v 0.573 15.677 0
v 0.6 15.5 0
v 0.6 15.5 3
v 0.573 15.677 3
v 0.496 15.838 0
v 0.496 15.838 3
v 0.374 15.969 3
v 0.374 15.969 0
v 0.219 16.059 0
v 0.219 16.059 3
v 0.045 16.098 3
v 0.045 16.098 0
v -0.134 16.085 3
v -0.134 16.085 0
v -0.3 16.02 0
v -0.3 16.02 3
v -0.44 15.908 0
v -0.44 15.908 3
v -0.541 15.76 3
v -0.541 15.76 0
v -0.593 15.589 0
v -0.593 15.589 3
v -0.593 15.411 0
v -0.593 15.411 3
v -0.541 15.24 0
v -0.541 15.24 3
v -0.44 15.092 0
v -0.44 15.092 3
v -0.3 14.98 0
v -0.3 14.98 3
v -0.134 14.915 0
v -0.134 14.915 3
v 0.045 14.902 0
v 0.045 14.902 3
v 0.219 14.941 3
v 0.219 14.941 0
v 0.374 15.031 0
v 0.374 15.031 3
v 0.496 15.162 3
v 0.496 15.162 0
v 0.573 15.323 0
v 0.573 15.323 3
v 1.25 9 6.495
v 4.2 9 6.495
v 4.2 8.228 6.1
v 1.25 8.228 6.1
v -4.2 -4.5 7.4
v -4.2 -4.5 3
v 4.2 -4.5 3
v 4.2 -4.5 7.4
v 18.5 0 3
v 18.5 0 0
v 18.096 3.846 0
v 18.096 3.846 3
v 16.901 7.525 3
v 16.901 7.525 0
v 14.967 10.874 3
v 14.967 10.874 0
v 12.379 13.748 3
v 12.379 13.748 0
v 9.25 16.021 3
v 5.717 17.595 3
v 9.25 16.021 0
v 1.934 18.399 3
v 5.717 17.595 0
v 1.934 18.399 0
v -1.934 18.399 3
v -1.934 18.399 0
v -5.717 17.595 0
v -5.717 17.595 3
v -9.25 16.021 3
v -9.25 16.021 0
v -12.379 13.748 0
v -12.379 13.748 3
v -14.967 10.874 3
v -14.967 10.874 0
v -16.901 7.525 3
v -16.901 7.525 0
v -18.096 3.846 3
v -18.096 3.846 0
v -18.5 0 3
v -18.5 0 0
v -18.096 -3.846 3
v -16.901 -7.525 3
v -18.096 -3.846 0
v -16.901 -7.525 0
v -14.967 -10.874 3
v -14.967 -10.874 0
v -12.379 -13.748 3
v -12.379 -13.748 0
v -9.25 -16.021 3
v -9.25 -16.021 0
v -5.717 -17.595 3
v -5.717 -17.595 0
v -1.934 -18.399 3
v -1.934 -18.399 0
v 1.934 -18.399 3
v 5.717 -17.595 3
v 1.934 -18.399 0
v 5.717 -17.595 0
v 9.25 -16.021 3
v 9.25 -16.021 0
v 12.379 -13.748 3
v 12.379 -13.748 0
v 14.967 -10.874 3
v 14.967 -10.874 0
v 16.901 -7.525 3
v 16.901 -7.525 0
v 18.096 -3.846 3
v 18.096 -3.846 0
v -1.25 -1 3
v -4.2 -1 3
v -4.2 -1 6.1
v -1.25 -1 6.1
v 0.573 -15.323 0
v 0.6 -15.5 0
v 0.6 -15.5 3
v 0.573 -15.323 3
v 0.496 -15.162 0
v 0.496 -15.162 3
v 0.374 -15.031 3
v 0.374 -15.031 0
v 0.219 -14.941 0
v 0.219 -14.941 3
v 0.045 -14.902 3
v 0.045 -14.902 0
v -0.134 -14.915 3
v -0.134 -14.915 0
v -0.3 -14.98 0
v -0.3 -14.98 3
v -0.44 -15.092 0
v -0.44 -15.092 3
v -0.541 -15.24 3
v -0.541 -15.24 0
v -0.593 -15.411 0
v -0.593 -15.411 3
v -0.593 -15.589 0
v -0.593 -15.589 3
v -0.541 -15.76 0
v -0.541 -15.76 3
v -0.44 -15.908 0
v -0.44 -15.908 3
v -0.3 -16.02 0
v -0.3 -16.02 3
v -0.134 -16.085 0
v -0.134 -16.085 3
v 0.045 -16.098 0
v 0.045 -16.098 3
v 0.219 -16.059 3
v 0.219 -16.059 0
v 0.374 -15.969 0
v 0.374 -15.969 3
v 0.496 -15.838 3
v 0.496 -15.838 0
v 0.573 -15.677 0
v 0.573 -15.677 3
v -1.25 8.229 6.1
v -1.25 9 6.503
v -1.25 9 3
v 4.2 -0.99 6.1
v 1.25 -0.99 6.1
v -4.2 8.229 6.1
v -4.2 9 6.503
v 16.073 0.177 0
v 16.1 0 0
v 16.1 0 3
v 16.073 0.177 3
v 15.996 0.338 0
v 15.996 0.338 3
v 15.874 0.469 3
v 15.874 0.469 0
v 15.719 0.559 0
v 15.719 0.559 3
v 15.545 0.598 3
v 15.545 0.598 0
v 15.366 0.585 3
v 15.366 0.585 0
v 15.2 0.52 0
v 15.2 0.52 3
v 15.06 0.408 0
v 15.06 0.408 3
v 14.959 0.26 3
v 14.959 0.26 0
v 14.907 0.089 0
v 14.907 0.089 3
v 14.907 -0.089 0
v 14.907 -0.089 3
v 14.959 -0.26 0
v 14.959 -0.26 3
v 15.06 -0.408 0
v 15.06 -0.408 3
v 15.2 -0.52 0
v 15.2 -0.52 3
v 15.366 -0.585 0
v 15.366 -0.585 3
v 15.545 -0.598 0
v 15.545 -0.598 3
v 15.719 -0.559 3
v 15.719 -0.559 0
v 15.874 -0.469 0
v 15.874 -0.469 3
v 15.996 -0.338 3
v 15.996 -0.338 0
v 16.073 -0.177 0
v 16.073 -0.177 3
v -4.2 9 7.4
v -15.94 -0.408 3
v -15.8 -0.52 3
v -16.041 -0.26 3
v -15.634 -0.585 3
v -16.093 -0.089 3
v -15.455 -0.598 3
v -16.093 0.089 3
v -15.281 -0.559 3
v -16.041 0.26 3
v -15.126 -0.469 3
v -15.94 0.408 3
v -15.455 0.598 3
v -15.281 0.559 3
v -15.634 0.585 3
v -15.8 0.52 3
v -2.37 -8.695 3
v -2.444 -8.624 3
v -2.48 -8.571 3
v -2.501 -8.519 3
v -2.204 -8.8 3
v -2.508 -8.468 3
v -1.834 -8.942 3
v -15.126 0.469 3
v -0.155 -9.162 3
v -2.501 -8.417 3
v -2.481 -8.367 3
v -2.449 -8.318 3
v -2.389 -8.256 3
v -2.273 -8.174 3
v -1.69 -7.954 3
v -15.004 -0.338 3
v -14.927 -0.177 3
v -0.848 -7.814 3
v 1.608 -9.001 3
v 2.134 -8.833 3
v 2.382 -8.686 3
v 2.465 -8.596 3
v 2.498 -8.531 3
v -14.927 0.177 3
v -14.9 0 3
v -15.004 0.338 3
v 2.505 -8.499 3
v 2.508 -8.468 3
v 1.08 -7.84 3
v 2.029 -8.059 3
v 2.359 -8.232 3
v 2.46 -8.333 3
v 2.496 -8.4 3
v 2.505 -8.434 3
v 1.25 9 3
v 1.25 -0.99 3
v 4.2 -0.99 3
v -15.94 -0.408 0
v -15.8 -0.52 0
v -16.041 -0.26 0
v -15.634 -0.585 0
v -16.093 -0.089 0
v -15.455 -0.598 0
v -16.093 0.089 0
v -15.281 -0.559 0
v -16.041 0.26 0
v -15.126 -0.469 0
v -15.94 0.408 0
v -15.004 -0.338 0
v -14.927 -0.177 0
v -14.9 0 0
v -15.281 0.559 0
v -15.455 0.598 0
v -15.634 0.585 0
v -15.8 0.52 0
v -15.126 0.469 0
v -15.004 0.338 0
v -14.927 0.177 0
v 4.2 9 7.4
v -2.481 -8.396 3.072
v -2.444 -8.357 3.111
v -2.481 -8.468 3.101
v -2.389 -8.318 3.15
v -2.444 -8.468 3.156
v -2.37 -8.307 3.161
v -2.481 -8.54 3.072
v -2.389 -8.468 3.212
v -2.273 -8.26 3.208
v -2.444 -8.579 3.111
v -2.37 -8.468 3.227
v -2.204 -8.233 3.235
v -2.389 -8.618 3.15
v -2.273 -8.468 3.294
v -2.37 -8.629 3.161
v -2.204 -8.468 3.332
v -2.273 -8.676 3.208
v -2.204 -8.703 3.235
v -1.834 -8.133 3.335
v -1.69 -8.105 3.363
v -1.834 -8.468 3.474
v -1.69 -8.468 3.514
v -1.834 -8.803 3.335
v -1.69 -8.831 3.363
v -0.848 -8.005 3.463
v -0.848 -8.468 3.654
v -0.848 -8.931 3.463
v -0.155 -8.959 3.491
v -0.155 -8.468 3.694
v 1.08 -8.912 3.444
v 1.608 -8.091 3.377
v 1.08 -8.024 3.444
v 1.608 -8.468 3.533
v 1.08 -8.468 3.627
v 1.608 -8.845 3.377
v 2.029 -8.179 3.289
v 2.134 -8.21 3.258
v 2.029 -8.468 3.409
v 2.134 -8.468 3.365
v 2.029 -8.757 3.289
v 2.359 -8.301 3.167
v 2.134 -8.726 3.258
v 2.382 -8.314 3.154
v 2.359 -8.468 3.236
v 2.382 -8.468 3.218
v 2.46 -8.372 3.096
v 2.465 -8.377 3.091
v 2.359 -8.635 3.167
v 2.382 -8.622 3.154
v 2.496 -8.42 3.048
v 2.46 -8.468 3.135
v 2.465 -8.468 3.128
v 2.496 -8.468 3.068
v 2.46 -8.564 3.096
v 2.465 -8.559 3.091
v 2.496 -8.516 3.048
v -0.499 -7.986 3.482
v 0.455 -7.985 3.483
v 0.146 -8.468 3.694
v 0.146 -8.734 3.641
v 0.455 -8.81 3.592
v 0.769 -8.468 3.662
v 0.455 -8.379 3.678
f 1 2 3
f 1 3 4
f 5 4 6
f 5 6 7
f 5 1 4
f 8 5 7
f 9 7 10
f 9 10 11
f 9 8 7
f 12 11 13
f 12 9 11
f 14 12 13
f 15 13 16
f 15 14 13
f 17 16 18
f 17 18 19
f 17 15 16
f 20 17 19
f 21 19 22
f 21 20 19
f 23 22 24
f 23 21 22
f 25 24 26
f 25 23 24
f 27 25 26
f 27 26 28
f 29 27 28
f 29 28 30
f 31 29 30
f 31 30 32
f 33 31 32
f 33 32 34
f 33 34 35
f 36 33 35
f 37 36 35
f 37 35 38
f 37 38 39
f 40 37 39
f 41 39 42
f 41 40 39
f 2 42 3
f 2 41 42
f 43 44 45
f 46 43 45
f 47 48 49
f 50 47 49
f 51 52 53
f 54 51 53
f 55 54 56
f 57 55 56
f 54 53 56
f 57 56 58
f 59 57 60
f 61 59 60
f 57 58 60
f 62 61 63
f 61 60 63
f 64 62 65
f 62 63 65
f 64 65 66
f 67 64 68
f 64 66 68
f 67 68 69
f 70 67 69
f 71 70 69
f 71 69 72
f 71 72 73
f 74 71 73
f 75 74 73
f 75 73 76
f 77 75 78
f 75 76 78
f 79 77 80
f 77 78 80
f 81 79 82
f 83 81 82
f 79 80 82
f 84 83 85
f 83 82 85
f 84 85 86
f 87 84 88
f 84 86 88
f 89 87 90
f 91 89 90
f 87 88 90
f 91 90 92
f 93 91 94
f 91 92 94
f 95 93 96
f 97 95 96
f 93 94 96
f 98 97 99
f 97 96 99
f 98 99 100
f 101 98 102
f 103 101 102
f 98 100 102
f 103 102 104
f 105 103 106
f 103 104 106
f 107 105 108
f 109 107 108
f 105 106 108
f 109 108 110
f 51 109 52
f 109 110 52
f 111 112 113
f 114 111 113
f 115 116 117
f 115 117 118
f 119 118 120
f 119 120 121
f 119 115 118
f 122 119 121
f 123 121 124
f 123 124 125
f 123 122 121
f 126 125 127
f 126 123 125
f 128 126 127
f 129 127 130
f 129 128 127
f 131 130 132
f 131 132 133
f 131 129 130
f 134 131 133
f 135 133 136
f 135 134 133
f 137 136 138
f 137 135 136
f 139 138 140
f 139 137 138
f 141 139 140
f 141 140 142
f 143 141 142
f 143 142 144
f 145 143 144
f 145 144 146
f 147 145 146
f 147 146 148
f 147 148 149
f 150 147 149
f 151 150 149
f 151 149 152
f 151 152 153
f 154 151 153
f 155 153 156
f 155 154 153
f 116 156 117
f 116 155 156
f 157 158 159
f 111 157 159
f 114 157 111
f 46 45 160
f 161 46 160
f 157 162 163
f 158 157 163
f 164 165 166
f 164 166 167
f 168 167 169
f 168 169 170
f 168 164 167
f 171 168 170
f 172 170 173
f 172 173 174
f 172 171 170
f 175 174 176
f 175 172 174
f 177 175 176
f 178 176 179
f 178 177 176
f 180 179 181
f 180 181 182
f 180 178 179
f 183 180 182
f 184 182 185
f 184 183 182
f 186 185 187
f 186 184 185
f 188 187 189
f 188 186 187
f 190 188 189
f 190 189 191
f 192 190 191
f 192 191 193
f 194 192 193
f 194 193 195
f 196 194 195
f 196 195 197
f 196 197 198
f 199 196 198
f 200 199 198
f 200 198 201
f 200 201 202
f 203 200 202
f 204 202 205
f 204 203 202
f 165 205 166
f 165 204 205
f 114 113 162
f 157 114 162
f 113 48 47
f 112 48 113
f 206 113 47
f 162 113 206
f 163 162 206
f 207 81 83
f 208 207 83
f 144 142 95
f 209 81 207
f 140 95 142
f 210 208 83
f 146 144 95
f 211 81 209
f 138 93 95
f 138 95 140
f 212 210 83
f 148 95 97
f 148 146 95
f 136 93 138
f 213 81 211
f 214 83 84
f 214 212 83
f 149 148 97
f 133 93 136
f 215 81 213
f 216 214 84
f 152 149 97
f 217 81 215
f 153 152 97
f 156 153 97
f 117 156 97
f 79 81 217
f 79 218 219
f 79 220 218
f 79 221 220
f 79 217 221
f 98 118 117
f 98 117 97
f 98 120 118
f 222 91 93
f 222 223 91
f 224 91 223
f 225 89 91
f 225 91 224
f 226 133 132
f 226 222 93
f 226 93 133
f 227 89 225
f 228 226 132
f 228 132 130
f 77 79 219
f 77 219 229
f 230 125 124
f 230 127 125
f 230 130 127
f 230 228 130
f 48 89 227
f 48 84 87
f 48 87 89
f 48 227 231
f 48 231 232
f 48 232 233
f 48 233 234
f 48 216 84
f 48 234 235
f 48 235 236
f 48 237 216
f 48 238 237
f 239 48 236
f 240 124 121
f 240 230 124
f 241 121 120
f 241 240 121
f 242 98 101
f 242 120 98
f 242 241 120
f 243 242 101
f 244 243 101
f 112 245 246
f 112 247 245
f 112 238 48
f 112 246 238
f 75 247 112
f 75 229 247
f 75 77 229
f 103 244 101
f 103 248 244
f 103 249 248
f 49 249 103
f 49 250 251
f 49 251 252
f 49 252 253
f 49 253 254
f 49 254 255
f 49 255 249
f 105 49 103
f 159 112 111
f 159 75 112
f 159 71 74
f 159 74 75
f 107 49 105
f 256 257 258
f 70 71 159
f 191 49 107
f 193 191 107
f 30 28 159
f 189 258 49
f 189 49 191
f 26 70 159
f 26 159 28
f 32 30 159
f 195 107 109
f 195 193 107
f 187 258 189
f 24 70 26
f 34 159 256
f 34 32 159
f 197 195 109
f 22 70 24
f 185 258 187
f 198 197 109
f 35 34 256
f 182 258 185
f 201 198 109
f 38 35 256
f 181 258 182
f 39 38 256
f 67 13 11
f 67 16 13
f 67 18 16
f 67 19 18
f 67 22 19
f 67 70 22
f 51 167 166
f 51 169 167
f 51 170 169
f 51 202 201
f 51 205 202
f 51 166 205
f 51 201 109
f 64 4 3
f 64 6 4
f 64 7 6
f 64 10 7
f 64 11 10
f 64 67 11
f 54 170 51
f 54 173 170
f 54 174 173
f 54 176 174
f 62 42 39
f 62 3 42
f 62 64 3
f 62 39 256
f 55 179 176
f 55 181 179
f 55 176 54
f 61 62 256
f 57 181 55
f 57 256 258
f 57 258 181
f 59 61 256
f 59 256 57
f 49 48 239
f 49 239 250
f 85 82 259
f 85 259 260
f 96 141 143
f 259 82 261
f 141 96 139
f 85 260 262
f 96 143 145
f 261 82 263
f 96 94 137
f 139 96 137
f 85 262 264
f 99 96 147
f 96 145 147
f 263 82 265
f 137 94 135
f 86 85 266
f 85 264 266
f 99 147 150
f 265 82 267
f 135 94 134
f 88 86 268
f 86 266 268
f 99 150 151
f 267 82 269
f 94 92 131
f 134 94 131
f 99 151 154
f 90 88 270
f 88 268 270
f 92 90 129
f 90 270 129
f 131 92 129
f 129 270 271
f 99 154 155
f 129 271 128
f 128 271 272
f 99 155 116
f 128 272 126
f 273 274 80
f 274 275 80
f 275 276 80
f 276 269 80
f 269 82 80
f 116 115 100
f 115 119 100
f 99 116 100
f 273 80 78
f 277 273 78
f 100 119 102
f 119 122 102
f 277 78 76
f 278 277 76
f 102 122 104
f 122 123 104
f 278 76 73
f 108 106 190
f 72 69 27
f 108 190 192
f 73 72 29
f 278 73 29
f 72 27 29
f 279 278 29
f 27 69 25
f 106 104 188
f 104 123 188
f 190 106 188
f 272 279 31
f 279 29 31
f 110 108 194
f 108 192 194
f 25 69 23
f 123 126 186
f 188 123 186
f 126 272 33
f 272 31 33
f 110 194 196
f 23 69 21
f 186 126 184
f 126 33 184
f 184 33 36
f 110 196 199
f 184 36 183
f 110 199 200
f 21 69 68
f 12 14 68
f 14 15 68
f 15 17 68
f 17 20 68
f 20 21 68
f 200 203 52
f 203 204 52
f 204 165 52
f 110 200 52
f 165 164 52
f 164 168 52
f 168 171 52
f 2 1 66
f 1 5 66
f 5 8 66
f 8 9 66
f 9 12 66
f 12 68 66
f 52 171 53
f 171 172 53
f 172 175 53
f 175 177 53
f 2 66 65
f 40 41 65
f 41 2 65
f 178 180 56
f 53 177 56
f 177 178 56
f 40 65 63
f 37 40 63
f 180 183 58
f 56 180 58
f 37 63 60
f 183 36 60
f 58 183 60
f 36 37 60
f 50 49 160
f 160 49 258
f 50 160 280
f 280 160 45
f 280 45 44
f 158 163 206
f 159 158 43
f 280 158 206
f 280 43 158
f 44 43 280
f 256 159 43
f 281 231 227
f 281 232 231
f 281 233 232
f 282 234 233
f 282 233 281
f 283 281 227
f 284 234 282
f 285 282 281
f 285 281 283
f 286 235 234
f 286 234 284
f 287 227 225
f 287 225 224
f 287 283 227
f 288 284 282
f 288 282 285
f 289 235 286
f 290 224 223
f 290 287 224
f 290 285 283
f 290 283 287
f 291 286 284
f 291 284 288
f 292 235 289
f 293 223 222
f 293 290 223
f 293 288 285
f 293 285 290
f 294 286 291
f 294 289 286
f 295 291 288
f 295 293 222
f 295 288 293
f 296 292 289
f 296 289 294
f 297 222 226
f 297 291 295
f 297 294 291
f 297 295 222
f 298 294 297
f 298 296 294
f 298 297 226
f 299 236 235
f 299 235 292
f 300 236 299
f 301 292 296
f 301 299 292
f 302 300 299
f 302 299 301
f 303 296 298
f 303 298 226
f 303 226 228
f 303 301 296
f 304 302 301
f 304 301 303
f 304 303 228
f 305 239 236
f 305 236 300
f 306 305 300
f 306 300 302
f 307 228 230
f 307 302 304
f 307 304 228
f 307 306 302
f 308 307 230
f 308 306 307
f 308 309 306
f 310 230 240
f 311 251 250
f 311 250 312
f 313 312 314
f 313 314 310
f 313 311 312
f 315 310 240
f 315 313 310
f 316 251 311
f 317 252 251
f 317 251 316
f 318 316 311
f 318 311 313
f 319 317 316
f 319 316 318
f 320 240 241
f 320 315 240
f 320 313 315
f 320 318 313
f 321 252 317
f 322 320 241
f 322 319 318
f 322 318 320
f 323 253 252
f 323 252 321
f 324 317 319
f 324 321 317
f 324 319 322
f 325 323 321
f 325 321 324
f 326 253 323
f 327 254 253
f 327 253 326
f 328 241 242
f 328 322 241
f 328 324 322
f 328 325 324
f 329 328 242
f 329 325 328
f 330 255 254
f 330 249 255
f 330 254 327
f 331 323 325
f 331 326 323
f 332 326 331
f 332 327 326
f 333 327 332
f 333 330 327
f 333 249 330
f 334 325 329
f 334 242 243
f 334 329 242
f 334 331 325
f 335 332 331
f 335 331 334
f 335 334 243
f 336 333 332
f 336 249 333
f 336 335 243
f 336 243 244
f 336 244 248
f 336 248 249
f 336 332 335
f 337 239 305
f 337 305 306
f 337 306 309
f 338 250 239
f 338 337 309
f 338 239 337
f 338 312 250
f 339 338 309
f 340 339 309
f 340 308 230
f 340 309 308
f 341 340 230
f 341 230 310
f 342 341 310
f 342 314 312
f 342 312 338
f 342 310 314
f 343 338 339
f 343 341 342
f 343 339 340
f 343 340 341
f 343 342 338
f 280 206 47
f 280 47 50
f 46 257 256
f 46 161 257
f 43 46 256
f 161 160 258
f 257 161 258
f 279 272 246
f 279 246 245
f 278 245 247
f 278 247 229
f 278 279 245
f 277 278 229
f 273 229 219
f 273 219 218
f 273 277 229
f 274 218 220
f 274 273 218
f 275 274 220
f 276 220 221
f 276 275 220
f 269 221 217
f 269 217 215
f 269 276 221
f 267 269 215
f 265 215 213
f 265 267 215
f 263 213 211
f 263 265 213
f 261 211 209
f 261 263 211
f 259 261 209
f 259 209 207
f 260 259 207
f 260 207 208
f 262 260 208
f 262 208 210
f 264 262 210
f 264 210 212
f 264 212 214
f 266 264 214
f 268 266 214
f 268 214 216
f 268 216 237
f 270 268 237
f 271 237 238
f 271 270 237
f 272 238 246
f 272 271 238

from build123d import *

# Parameters (mm, degrees)
F0_R     = 18.5
F0_R_2   = 0.6
F1_DEPTH = 3
F2_W     = 8.4
F2_H     = 13.5
F3_DEPTH = 4.4
F5_DEPTH = 2.95
F7_DEPTH = 2.95


with BuildPart() as f1:
    # F0 (on Top) → F1 (new body)
    with BuildSketch(Plane.XY):
        Circle(F0_R)
        with Locations((0, -15.5)):
            Circle(F0_R_2, mode=Mode.SUBTRACT)
        with Locations((-15.5, 0)):
            Circle(F0_R_2, mode=Mode.SUBTRACT)
        with Locations((15.5, 0)):
            Circle(F0_R_2, mode=Mode.SUBTRACT)
        with Locations((0, 15.5)):
            Circle(F0_R_2, mode=Mode.SUBTRACT)
    extrude(amount=F1_DEPTH)

    # F2 (on face) → F3 (join)
    with BuildSketch(Plane.XY.offset(3)):
        with Locations((0, 2.25)):
            Rectangle(F2_W, F2_H)
    extrude(amount=F3_DEPTH)

    # F4 (on face) → F5 (cut)
    with BuildSketch(Plane(origin=(-4.2, 0, 0), x_dir=(0, -1, 0), z_dir=(-1, 0, 0))):
        Polygon((-9, 3), (1, 3), (1, 6.1), (-8.229371, 6.1), (-9, 6.503245), align=None)
    extrude(amount=-F5_DEPTH, mode=Mode.SUBTRACT)

    # F6 (on face) → F7 (cut)
    with BuildSketch(Plane.YZ.offset(4.2)):
        Polygon((-0.99, 3), (9, 3), (9, 6.494885), (8.228009, 6.1), (-0.219371, 6.1), (-0.99, 6.1), align=None)
    extrude(amount=-F7_DEPTH, mode=Mode.SUBTRACT)

    # F8 (on face) → F9 (revolve)
    with BuildSketch(Plane.XY.offset(3)):
        with BuildLine():
            Line((2.508028, -8.467954), (-2.508028, -8.467954))
            add(Edge.make_bspline(
                [(-2.508028, -8.467954), (-2.508028, -9.163152), (0, -9.163152), (2.508028, -9.163152), (2.508028, -8.467954)],
                knots=[0, 0, 0, 1.570796, 1.570796, 3.141593, 3.141593, 3.141593], degree=2, weights=[1, 0.707107, 1, 0.707107, 1]))
        make_face()
    revolve(axis=Axis((0, -8.467954, 3), (1, 0, 0)))


solid = f1.part
